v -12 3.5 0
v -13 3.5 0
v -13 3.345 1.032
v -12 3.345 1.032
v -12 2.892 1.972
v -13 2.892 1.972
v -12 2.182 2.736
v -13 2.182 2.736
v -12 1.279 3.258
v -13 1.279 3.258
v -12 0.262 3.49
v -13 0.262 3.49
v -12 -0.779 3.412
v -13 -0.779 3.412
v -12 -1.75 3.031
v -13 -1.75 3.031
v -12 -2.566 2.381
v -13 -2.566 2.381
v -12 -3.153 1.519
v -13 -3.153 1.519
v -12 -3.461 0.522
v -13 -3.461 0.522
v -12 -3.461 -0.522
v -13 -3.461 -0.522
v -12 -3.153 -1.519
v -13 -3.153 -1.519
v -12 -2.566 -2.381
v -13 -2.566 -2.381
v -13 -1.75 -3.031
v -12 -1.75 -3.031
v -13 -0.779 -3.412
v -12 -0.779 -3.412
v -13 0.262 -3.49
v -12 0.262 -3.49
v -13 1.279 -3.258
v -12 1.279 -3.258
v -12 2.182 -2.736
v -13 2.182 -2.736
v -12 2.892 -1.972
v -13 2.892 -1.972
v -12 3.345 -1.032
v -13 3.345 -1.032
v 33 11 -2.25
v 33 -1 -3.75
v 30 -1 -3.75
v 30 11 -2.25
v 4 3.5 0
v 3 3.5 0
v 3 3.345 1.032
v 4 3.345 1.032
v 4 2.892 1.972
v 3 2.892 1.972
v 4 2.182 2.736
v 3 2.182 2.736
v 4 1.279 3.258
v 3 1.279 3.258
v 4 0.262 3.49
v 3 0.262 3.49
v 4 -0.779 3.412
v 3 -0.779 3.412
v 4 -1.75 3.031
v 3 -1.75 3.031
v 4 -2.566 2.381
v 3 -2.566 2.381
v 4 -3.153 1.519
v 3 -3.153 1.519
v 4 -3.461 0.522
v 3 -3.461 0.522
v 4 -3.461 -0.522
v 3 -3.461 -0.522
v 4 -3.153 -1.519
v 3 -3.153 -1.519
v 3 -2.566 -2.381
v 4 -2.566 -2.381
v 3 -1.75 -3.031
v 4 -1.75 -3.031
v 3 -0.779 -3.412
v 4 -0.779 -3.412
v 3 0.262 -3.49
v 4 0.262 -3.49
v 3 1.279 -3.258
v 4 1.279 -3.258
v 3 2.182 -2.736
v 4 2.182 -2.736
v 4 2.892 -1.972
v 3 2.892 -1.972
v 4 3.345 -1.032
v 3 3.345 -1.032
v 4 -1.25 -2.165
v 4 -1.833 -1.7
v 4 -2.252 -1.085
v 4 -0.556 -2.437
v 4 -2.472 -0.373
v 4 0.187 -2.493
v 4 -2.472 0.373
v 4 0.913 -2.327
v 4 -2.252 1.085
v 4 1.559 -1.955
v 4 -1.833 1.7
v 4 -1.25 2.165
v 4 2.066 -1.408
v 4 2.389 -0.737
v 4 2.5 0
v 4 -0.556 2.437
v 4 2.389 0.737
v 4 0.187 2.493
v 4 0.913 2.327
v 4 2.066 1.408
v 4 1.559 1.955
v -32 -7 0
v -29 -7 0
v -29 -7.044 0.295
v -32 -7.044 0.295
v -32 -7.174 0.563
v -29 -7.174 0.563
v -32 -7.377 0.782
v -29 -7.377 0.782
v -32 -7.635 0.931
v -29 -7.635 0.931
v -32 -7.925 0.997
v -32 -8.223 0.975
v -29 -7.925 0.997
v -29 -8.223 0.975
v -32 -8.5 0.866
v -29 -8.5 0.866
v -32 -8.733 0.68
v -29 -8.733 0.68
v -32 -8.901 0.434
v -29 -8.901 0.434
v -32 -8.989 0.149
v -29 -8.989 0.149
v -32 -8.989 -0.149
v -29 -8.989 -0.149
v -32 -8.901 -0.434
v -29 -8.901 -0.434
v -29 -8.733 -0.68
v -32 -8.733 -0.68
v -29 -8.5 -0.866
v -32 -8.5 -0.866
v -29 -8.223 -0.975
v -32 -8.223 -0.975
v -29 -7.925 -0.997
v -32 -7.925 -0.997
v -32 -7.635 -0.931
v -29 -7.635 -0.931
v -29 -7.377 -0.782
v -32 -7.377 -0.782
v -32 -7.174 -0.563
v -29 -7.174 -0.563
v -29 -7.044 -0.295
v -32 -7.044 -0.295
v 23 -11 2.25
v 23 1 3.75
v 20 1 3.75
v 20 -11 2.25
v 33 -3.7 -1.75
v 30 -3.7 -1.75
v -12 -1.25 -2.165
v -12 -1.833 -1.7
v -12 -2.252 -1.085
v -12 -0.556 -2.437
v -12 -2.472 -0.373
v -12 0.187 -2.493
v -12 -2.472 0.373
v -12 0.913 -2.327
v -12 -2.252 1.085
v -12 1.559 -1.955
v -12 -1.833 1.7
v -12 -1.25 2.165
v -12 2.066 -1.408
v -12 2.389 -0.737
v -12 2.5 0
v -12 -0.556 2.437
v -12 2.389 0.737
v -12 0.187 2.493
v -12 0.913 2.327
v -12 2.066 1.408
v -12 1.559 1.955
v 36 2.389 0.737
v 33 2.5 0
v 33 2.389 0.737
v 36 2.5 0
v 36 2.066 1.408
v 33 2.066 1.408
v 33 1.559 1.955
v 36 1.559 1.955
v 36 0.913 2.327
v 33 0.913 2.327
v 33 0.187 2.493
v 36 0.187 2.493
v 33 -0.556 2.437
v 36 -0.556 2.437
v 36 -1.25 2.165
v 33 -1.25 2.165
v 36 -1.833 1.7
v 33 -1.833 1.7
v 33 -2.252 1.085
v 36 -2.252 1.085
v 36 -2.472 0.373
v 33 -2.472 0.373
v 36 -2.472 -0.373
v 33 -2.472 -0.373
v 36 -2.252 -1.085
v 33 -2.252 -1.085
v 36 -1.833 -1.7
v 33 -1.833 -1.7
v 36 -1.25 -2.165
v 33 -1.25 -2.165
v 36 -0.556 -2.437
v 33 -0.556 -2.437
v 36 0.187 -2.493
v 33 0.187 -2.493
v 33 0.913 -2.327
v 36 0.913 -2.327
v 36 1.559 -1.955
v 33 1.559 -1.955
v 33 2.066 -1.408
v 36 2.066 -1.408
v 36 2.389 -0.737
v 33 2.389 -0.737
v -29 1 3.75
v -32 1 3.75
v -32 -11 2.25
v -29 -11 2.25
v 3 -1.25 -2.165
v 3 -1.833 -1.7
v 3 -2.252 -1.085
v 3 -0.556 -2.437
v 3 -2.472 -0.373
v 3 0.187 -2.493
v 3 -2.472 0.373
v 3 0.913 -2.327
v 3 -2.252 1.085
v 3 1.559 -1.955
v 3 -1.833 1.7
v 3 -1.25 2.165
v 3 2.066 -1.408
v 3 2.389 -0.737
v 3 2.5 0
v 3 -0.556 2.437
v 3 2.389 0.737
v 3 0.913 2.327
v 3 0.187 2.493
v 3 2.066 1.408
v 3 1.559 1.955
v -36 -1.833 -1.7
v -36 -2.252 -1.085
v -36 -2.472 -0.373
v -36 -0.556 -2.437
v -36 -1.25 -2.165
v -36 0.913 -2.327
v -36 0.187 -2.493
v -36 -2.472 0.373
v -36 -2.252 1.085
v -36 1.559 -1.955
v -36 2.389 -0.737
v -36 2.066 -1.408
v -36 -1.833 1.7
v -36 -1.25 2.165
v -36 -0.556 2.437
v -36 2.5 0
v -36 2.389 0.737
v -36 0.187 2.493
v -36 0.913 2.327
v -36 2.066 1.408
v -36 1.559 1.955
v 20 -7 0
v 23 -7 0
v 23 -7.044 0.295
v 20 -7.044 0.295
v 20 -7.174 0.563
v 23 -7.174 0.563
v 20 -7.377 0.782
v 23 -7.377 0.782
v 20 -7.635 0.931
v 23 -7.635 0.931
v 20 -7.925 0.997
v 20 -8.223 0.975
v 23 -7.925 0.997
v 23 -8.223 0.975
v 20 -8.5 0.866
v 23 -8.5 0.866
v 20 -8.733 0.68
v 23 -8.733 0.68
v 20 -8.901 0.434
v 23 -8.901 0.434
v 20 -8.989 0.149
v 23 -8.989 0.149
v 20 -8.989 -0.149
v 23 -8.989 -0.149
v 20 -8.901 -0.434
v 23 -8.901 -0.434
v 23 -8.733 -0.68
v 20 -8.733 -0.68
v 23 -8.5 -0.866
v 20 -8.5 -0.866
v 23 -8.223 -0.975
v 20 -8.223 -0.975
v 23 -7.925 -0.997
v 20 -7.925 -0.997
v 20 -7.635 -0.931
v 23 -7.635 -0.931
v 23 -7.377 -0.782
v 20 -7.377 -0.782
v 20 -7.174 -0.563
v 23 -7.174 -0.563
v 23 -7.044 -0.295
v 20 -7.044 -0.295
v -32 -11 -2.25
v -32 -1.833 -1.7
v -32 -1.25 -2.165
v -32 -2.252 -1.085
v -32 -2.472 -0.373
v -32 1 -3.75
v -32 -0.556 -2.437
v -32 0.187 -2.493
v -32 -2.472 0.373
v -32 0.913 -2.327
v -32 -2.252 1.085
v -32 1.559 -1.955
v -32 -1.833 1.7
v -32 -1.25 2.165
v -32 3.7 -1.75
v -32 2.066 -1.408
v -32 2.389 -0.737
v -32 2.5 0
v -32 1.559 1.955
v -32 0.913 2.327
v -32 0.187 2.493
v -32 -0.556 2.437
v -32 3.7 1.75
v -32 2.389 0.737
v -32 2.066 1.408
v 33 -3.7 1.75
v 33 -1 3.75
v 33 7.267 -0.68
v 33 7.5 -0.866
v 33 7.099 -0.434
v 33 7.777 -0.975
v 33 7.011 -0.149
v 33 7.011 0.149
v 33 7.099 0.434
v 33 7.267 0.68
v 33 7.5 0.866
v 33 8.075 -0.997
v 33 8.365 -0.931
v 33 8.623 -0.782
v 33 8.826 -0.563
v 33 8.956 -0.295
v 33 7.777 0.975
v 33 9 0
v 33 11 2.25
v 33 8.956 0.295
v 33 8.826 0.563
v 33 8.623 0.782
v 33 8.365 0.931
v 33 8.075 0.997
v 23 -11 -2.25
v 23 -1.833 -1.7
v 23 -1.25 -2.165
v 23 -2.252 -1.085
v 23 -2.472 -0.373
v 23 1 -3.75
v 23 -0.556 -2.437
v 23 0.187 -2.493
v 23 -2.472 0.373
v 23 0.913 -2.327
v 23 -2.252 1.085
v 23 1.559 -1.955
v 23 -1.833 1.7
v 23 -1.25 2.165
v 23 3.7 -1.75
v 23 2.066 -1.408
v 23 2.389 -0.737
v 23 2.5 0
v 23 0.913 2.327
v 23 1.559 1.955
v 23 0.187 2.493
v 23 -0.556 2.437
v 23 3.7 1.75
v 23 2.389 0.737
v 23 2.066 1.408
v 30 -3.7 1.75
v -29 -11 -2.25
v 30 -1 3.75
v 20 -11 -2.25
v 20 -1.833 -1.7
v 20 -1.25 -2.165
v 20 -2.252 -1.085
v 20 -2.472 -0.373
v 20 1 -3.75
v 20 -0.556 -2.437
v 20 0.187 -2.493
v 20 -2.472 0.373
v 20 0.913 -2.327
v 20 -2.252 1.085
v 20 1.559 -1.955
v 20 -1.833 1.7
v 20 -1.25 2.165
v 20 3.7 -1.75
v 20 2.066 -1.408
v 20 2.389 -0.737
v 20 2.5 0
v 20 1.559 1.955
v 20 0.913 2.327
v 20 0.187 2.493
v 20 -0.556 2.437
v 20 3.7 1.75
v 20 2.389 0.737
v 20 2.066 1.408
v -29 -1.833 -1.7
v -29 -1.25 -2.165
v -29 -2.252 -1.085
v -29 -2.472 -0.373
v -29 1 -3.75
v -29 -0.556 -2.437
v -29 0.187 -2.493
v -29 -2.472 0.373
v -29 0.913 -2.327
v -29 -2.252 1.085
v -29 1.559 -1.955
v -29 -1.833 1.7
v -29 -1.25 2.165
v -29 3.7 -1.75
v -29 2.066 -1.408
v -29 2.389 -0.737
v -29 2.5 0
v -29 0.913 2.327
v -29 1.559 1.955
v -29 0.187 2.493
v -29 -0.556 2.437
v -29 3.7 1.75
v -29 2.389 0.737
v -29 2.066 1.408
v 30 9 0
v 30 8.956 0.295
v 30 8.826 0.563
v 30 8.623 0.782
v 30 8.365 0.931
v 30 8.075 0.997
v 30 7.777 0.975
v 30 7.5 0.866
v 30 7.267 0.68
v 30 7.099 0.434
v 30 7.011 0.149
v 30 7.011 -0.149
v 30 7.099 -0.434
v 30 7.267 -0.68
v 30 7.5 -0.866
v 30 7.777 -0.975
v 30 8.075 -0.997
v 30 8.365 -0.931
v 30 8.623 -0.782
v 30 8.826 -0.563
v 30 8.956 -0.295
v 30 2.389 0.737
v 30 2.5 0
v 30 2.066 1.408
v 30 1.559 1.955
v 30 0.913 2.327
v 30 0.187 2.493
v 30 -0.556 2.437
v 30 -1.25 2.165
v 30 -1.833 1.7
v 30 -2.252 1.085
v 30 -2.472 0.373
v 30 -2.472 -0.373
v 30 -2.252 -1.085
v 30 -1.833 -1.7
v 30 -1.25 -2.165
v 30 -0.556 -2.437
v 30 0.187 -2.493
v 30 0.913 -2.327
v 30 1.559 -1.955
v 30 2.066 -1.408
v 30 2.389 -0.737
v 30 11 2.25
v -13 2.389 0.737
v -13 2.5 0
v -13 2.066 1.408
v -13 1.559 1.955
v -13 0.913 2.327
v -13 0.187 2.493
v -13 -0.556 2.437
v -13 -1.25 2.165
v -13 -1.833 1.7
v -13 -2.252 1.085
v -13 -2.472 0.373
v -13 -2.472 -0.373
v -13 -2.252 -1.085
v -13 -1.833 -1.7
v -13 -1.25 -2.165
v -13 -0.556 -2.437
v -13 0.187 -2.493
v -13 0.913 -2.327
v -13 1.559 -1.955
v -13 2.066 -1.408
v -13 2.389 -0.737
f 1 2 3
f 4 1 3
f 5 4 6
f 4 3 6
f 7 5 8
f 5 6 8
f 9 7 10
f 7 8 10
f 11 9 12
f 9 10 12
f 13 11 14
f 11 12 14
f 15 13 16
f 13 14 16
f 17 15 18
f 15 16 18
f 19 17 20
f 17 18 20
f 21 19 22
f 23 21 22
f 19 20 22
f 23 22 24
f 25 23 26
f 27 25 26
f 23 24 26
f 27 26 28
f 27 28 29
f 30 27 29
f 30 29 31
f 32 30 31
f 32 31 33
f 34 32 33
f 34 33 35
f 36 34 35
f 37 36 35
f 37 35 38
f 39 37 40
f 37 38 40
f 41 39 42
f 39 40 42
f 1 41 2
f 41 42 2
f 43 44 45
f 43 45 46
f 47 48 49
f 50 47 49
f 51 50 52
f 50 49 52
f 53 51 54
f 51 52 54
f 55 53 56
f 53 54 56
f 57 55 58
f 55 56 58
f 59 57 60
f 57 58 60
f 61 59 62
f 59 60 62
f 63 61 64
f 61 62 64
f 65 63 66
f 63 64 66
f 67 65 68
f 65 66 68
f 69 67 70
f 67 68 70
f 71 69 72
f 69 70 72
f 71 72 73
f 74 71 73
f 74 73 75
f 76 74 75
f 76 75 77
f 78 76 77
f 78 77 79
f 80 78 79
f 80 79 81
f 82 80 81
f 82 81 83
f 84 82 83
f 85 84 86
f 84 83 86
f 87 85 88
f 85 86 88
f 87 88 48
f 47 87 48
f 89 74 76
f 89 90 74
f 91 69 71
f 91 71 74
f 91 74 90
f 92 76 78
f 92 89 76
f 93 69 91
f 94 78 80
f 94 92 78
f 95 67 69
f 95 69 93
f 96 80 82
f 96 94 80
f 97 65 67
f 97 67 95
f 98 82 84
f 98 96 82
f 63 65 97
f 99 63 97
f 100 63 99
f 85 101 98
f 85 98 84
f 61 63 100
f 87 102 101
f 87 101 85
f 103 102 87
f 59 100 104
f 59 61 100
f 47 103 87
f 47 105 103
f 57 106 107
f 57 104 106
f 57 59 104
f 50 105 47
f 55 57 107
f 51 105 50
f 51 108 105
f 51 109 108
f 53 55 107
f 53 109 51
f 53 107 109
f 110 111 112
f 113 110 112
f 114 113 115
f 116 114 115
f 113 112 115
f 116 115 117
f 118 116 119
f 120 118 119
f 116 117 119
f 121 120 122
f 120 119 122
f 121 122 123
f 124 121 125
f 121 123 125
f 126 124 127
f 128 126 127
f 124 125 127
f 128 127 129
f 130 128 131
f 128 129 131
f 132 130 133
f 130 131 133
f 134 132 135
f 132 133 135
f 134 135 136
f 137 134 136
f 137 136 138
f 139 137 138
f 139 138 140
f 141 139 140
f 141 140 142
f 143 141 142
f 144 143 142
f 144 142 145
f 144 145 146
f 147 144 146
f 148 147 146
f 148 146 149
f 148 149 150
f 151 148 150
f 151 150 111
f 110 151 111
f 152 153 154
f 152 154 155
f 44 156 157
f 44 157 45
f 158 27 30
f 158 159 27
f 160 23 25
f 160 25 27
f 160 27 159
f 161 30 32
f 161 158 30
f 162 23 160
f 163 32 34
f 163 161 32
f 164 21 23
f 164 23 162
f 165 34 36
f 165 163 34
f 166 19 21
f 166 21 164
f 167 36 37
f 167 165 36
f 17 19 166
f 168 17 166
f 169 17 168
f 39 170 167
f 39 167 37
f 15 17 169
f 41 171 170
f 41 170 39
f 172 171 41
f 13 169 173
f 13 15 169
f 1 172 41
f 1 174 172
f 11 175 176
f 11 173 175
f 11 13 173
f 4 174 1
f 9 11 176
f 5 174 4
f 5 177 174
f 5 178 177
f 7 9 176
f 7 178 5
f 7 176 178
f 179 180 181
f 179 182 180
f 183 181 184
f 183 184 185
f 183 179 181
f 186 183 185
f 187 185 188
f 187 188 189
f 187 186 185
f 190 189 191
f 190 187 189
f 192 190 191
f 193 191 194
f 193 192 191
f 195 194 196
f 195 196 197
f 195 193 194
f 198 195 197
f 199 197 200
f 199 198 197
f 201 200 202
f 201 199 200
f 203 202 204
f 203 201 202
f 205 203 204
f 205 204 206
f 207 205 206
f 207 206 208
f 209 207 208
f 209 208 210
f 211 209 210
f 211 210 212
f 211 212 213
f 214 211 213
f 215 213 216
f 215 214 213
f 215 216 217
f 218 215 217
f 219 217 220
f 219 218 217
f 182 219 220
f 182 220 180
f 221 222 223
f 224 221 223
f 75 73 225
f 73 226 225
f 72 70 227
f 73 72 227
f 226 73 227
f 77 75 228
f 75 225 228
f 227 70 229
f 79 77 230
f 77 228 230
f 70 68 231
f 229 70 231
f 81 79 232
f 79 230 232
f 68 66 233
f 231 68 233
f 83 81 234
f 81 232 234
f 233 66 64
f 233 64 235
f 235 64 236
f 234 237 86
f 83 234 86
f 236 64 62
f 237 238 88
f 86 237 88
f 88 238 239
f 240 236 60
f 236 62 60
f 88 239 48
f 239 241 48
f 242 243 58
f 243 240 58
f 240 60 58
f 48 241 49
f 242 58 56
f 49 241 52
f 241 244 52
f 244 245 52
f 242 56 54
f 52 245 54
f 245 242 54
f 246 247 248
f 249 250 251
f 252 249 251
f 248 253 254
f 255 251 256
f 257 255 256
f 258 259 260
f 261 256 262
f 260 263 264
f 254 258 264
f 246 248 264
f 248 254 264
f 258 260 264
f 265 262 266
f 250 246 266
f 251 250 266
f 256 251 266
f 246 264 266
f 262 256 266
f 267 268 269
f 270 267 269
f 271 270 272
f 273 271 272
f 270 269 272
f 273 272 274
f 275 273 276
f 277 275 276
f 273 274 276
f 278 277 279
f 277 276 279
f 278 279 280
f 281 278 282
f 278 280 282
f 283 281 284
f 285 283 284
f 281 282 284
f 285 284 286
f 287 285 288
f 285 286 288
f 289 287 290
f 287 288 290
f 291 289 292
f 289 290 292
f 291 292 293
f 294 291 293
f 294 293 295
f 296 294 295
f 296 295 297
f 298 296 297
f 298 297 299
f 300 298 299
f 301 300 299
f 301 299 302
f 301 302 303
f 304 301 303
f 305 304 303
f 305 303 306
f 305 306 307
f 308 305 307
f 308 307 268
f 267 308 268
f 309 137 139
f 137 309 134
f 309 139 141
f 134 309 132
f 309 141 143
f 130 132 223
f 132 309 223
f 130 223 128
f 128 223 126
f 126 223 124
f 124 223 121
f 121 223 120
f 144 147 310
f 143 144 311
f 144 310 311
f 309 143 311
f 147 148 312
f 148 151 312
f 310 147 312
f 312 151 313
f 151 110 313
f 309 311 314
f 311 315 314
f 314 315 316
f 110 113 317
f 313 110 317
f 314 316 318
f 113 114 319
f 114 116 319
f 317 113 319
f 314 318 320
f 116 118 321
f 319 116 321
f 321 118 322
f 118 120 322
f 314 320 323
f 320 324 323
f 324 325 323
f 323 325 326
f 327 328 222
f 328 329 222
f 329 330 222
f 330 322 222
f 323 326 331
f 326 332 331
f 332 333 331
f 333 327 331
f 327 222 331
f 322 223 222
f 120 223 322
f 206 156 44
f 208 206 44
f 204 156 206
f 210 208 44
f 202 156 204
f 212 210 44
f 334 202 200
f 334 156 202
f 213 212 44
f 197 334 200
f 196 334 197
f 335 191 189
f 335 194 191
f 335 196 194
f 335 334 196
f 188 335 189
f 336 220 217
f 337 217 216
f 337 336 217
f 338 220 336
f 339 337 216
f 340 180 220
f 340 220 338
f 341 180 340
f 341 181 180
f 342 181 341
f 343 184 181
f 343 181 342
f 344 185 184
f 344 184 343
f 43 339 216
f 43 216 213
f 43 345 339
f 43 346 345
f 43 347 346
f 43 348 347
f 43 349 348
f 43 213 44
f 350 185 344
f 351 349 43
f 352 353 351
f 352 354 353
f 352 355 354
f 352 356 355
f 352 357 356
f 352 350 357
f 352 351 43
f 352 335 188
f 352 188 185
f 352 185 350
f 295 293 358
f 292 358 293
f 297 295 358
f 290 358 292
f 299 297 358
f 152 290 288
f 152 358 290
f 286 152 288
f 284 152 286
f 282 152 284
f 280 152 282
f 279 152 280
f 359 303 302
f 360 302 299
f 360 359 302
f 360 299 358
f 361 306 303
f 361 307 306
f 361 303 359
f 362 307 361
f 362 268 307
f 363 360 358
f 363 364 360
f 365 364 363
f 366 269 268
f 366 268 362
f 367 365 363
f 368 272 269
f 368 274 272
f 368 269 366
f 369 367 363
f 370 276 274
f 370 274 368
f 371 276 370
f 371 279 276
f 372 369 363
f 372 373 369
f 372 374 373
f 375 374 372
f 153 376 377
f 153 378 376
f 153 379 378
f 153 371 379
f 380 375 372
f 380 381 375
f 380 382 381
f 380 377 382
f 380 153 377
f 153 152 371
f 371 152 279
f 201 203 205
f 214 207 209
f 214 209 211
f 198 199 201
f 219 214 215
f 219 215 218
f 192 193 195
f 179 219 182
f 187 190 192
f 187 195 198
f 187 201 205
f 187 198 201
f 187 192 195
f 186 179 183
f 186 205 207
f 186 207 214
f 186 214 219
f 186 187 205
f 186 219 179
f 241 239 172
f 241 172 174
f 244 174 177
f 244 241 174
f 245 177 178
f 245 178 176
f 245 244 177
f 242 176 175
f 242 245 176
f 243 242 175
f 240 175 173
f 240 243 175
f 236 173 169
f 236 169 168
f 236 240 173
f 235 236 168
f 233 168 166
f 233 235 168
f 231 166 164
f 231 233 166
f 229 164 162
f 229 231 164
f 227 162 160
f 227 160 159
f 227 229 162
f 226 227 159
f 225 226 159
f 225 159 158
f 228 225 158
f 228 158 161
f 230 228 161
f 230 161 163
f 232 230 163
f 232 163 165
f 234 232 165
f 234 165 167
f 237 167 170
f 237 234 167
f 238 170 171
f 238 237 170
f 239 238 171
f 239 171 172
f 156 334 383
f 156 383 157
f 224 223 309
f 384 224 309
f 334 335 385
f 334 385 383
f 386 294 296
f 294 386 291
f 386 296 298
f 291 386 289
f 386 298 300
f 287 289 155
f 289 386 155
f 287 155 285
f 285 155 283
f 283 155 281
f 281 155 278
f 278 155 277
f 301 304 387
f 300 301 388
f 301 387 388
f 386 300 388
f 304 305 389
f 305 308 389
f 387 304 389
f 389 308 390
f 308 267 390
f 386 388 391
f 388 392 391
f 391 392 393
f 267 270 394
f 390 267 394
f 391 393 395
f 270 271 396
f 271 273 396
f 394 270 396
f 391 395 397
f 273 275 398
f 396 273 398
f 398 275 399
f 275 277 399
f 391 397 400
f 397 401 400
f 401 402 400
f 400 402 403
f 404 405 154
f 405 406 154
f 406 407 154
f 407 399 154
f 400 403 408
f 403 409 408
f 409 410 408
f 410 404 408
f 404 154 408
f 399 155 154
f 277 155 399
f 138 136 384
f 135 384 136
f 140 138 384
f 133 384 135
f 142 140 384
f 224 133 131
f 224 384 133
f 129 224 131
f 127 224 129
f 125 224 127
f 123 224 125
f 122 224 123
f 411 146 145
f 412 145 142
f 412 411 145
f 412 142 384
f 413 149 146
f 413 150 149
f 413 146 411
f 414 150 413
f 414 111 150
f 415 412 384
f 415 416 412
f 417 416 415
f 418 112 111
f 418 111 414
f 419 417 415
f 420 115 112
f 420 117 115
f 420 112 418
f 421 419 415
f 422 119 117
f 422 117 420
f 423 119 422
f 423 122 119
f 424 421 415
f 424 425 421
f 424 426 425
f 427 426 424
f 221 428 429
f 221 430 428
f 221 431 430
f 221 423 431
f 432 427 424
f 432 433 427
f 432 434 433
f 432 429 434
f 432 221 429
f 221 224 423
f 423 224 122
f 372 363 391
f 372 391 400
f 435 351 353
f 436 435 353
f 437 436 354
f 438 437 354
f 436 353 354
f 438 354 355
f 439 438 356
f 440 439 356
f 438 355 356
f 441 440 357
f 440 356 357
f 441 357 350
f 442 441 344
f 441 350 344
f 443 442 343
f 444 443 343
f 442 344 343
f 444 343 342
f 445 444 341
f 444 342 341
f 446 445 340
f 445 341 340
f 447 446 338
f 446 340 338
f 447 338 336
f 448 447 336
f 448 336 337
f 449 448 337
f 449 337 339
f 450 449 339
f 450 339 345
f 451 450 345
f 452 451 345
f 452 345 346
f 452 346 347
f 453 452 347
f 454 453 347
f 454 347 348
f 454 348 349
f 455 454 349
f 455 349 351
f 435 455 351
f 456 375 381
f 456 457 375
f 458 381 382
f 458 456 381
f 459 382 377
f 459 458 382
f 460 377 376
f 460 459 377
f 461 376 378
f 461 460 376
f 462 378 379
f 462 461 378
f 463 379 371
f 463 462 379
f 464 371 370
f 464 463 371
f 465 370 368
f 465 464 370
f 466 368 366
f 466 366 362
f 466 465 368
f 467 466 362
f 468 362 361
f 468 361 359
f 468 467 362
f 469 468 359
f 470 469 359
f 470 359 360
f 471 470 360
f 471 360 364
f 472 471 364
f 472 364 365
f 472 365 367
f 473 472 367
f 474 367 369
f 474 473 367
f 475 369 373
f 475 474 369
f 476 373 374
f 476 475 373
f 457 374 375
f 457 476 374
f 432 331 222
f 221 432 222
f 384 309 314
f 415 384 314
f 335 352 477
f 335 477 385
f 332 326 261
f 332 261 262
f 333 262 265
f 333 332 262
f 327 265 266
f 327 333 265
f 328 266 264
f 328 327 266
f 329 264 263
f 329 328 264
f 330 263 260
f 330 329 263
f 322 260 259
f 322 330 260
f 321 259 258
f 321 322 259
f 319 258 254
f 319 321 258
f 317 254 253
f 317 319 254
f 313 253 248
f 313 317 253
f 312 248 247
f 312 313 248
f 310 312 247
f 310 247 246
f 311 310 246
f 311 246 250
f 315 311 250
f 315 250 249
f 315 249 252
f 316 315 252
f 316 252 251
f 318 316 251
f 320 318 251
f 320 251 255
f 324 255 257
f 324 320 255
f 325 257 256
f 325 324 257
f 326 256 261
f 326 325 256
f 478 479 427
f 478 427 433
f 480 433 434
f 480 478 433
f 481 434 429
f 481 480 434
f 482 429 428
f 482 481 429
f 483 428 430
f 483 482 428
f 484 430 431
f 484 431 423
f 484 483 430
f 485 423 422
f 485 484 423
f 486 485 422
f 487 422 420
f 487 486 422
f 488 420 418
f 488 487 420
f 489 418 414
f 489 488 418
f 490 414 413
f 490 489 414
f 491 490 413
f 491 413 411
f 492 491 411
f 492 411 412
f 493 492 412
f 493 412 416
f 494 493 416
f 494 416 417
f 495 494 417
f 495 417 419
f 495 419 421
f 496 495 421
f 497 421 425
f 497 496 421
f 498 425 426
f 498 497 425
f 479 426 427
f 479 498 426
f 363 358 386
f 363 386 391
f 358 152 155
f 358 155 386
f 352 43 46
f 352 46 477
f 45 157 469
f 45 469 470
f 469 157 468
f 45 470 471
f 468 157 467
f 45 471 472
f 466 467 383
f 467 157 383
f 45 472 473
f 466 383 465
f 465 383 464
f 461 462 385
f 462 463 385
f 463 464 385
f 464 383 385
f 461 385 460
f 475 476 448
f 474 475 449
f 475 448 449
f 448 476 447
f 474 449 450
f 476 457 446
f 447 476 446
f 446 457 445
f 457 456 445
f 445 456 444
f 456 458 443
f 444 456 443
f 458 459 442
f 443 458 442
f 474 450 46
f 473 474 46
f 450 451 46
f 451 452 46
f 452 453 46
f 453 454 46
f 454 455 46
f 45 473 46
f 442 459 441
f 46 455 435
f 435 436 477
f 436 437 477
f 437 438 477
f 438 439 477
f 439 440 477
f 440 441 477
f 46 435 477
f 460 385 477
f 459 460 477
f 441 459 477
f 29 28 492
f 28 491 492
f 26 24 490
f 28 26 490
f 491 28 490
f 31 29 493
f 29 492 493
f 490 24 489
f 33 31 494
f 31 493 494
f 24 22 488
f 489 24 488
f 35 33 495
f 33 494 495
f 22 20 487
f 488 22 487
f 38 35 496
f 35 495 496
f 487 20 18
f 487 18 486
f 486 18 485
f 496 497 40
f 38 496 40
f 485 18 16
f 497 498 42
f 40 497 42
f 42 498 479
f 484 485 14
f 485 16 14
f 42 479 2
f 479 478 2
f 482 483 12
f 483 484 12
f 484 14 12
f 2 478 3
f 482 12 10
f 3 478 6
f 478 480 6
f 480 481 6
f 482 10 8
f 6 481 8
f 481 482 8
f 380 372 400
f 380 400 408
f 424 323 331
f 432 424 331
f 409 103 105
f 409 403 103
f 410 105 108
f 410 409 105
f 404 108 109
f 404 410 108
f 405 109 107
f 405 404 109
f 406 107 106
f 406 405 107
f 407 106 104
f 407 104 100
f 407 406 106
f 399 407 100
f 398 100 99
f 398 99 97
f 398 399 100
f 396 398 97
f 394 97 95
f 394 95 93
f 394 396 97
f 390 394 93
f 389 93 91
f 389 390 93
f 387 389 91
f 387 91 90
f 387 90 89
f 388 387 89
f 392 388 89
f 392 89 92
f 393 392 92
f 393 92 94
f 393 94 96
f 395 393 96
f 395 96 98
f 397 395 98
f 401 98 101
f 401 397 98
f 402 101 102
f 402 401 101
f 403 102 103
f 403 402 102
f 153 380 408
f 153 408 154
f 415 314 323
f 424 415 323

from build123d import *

# Parameters (mm, degrees)
F0_R      = 2.5
F1_DEPTH  = 36
F4_DEPTH  = 3
F6_R      = 3.5
F7_DEPTH  = 1
F9_R      = 3.5
F10_DEPTH = 1
F13_DEPTH = 3
F16_DEPTH = 3
F18_R     = 1
F19_DEPTH = 69.001
F17_R     = 1
F20_DEPTH = 59.001


with BuildPart() as f1:
    # F0 (on Right) → F1 (new body, symmetric)
    with BuildSketch(Plane.YZ):
        Circle(F0_R)
    extrude(amount=F1_DEPTH, both=True)

    # F3 (on offset) → F4 (join)
    with BuildSketch(Plane.YZ.offset(-32)):
        Polygon((3.7, -1.75), (3.7, 1.75), (1, 3.75), (-11, 2.25), (-11, -2.25), (1, -3.75), align=None)
    extrude(amount=F4_DEPTH)

    # F6 (on offset) → F7 (join)
    with BuildSketch(Plane.YZ.offset(-13)):
        Circle(F6_R)
    extrude(amount=F7_DEPTH)

    # F9 (on offset) → F10 (join)
    with BuildSketch(Plane.YZ.offset(3)):
        Circle(F9_R)
    extrude(amount=F10_DEPTH)

    # F12 (on offset) → F13 (join)
    with BuildSketch(Plane.YZ.offset(33)):
        Polygon((-1, 3.75), (-3.7, 1.75), (-3.7, -1.75), (-1, -3.75), (11, -2.25), (11, 2.25), align=None)
    extrude(amount=-F13_DEPTH)

    # F15 (on offset) → F16 (join)
    with BuildSketch(Plane.YZ.offset(23)):
        Polygon((3.7, -1.75), (3.7, 1.75), (1, 3.75), (-11, 2.25), (-11, -2.25), (1, -3.75), align=None)
    extrude(amount=-F16_DEPTH)

    # F18 (on face) → F19 (cut, through all)
    with BuildSketch(Plane.YZ.offset(33)):
        with Locations((8, 0)):
            Circle(F18_R)
    extrude(amount=-F19_DEPTH, mode=Mode.SUBTRACT)

    # F17 (on face) → F20 (cut, through all)
    with BuildSketch(Plane.YZ.offset(23)):
        with Locations((-8, 0)):
            Circle(F17_R)
    extrude(amount=-F20_DEPTH, mode=Mode.SUBTRACT)


solid = f1.part
